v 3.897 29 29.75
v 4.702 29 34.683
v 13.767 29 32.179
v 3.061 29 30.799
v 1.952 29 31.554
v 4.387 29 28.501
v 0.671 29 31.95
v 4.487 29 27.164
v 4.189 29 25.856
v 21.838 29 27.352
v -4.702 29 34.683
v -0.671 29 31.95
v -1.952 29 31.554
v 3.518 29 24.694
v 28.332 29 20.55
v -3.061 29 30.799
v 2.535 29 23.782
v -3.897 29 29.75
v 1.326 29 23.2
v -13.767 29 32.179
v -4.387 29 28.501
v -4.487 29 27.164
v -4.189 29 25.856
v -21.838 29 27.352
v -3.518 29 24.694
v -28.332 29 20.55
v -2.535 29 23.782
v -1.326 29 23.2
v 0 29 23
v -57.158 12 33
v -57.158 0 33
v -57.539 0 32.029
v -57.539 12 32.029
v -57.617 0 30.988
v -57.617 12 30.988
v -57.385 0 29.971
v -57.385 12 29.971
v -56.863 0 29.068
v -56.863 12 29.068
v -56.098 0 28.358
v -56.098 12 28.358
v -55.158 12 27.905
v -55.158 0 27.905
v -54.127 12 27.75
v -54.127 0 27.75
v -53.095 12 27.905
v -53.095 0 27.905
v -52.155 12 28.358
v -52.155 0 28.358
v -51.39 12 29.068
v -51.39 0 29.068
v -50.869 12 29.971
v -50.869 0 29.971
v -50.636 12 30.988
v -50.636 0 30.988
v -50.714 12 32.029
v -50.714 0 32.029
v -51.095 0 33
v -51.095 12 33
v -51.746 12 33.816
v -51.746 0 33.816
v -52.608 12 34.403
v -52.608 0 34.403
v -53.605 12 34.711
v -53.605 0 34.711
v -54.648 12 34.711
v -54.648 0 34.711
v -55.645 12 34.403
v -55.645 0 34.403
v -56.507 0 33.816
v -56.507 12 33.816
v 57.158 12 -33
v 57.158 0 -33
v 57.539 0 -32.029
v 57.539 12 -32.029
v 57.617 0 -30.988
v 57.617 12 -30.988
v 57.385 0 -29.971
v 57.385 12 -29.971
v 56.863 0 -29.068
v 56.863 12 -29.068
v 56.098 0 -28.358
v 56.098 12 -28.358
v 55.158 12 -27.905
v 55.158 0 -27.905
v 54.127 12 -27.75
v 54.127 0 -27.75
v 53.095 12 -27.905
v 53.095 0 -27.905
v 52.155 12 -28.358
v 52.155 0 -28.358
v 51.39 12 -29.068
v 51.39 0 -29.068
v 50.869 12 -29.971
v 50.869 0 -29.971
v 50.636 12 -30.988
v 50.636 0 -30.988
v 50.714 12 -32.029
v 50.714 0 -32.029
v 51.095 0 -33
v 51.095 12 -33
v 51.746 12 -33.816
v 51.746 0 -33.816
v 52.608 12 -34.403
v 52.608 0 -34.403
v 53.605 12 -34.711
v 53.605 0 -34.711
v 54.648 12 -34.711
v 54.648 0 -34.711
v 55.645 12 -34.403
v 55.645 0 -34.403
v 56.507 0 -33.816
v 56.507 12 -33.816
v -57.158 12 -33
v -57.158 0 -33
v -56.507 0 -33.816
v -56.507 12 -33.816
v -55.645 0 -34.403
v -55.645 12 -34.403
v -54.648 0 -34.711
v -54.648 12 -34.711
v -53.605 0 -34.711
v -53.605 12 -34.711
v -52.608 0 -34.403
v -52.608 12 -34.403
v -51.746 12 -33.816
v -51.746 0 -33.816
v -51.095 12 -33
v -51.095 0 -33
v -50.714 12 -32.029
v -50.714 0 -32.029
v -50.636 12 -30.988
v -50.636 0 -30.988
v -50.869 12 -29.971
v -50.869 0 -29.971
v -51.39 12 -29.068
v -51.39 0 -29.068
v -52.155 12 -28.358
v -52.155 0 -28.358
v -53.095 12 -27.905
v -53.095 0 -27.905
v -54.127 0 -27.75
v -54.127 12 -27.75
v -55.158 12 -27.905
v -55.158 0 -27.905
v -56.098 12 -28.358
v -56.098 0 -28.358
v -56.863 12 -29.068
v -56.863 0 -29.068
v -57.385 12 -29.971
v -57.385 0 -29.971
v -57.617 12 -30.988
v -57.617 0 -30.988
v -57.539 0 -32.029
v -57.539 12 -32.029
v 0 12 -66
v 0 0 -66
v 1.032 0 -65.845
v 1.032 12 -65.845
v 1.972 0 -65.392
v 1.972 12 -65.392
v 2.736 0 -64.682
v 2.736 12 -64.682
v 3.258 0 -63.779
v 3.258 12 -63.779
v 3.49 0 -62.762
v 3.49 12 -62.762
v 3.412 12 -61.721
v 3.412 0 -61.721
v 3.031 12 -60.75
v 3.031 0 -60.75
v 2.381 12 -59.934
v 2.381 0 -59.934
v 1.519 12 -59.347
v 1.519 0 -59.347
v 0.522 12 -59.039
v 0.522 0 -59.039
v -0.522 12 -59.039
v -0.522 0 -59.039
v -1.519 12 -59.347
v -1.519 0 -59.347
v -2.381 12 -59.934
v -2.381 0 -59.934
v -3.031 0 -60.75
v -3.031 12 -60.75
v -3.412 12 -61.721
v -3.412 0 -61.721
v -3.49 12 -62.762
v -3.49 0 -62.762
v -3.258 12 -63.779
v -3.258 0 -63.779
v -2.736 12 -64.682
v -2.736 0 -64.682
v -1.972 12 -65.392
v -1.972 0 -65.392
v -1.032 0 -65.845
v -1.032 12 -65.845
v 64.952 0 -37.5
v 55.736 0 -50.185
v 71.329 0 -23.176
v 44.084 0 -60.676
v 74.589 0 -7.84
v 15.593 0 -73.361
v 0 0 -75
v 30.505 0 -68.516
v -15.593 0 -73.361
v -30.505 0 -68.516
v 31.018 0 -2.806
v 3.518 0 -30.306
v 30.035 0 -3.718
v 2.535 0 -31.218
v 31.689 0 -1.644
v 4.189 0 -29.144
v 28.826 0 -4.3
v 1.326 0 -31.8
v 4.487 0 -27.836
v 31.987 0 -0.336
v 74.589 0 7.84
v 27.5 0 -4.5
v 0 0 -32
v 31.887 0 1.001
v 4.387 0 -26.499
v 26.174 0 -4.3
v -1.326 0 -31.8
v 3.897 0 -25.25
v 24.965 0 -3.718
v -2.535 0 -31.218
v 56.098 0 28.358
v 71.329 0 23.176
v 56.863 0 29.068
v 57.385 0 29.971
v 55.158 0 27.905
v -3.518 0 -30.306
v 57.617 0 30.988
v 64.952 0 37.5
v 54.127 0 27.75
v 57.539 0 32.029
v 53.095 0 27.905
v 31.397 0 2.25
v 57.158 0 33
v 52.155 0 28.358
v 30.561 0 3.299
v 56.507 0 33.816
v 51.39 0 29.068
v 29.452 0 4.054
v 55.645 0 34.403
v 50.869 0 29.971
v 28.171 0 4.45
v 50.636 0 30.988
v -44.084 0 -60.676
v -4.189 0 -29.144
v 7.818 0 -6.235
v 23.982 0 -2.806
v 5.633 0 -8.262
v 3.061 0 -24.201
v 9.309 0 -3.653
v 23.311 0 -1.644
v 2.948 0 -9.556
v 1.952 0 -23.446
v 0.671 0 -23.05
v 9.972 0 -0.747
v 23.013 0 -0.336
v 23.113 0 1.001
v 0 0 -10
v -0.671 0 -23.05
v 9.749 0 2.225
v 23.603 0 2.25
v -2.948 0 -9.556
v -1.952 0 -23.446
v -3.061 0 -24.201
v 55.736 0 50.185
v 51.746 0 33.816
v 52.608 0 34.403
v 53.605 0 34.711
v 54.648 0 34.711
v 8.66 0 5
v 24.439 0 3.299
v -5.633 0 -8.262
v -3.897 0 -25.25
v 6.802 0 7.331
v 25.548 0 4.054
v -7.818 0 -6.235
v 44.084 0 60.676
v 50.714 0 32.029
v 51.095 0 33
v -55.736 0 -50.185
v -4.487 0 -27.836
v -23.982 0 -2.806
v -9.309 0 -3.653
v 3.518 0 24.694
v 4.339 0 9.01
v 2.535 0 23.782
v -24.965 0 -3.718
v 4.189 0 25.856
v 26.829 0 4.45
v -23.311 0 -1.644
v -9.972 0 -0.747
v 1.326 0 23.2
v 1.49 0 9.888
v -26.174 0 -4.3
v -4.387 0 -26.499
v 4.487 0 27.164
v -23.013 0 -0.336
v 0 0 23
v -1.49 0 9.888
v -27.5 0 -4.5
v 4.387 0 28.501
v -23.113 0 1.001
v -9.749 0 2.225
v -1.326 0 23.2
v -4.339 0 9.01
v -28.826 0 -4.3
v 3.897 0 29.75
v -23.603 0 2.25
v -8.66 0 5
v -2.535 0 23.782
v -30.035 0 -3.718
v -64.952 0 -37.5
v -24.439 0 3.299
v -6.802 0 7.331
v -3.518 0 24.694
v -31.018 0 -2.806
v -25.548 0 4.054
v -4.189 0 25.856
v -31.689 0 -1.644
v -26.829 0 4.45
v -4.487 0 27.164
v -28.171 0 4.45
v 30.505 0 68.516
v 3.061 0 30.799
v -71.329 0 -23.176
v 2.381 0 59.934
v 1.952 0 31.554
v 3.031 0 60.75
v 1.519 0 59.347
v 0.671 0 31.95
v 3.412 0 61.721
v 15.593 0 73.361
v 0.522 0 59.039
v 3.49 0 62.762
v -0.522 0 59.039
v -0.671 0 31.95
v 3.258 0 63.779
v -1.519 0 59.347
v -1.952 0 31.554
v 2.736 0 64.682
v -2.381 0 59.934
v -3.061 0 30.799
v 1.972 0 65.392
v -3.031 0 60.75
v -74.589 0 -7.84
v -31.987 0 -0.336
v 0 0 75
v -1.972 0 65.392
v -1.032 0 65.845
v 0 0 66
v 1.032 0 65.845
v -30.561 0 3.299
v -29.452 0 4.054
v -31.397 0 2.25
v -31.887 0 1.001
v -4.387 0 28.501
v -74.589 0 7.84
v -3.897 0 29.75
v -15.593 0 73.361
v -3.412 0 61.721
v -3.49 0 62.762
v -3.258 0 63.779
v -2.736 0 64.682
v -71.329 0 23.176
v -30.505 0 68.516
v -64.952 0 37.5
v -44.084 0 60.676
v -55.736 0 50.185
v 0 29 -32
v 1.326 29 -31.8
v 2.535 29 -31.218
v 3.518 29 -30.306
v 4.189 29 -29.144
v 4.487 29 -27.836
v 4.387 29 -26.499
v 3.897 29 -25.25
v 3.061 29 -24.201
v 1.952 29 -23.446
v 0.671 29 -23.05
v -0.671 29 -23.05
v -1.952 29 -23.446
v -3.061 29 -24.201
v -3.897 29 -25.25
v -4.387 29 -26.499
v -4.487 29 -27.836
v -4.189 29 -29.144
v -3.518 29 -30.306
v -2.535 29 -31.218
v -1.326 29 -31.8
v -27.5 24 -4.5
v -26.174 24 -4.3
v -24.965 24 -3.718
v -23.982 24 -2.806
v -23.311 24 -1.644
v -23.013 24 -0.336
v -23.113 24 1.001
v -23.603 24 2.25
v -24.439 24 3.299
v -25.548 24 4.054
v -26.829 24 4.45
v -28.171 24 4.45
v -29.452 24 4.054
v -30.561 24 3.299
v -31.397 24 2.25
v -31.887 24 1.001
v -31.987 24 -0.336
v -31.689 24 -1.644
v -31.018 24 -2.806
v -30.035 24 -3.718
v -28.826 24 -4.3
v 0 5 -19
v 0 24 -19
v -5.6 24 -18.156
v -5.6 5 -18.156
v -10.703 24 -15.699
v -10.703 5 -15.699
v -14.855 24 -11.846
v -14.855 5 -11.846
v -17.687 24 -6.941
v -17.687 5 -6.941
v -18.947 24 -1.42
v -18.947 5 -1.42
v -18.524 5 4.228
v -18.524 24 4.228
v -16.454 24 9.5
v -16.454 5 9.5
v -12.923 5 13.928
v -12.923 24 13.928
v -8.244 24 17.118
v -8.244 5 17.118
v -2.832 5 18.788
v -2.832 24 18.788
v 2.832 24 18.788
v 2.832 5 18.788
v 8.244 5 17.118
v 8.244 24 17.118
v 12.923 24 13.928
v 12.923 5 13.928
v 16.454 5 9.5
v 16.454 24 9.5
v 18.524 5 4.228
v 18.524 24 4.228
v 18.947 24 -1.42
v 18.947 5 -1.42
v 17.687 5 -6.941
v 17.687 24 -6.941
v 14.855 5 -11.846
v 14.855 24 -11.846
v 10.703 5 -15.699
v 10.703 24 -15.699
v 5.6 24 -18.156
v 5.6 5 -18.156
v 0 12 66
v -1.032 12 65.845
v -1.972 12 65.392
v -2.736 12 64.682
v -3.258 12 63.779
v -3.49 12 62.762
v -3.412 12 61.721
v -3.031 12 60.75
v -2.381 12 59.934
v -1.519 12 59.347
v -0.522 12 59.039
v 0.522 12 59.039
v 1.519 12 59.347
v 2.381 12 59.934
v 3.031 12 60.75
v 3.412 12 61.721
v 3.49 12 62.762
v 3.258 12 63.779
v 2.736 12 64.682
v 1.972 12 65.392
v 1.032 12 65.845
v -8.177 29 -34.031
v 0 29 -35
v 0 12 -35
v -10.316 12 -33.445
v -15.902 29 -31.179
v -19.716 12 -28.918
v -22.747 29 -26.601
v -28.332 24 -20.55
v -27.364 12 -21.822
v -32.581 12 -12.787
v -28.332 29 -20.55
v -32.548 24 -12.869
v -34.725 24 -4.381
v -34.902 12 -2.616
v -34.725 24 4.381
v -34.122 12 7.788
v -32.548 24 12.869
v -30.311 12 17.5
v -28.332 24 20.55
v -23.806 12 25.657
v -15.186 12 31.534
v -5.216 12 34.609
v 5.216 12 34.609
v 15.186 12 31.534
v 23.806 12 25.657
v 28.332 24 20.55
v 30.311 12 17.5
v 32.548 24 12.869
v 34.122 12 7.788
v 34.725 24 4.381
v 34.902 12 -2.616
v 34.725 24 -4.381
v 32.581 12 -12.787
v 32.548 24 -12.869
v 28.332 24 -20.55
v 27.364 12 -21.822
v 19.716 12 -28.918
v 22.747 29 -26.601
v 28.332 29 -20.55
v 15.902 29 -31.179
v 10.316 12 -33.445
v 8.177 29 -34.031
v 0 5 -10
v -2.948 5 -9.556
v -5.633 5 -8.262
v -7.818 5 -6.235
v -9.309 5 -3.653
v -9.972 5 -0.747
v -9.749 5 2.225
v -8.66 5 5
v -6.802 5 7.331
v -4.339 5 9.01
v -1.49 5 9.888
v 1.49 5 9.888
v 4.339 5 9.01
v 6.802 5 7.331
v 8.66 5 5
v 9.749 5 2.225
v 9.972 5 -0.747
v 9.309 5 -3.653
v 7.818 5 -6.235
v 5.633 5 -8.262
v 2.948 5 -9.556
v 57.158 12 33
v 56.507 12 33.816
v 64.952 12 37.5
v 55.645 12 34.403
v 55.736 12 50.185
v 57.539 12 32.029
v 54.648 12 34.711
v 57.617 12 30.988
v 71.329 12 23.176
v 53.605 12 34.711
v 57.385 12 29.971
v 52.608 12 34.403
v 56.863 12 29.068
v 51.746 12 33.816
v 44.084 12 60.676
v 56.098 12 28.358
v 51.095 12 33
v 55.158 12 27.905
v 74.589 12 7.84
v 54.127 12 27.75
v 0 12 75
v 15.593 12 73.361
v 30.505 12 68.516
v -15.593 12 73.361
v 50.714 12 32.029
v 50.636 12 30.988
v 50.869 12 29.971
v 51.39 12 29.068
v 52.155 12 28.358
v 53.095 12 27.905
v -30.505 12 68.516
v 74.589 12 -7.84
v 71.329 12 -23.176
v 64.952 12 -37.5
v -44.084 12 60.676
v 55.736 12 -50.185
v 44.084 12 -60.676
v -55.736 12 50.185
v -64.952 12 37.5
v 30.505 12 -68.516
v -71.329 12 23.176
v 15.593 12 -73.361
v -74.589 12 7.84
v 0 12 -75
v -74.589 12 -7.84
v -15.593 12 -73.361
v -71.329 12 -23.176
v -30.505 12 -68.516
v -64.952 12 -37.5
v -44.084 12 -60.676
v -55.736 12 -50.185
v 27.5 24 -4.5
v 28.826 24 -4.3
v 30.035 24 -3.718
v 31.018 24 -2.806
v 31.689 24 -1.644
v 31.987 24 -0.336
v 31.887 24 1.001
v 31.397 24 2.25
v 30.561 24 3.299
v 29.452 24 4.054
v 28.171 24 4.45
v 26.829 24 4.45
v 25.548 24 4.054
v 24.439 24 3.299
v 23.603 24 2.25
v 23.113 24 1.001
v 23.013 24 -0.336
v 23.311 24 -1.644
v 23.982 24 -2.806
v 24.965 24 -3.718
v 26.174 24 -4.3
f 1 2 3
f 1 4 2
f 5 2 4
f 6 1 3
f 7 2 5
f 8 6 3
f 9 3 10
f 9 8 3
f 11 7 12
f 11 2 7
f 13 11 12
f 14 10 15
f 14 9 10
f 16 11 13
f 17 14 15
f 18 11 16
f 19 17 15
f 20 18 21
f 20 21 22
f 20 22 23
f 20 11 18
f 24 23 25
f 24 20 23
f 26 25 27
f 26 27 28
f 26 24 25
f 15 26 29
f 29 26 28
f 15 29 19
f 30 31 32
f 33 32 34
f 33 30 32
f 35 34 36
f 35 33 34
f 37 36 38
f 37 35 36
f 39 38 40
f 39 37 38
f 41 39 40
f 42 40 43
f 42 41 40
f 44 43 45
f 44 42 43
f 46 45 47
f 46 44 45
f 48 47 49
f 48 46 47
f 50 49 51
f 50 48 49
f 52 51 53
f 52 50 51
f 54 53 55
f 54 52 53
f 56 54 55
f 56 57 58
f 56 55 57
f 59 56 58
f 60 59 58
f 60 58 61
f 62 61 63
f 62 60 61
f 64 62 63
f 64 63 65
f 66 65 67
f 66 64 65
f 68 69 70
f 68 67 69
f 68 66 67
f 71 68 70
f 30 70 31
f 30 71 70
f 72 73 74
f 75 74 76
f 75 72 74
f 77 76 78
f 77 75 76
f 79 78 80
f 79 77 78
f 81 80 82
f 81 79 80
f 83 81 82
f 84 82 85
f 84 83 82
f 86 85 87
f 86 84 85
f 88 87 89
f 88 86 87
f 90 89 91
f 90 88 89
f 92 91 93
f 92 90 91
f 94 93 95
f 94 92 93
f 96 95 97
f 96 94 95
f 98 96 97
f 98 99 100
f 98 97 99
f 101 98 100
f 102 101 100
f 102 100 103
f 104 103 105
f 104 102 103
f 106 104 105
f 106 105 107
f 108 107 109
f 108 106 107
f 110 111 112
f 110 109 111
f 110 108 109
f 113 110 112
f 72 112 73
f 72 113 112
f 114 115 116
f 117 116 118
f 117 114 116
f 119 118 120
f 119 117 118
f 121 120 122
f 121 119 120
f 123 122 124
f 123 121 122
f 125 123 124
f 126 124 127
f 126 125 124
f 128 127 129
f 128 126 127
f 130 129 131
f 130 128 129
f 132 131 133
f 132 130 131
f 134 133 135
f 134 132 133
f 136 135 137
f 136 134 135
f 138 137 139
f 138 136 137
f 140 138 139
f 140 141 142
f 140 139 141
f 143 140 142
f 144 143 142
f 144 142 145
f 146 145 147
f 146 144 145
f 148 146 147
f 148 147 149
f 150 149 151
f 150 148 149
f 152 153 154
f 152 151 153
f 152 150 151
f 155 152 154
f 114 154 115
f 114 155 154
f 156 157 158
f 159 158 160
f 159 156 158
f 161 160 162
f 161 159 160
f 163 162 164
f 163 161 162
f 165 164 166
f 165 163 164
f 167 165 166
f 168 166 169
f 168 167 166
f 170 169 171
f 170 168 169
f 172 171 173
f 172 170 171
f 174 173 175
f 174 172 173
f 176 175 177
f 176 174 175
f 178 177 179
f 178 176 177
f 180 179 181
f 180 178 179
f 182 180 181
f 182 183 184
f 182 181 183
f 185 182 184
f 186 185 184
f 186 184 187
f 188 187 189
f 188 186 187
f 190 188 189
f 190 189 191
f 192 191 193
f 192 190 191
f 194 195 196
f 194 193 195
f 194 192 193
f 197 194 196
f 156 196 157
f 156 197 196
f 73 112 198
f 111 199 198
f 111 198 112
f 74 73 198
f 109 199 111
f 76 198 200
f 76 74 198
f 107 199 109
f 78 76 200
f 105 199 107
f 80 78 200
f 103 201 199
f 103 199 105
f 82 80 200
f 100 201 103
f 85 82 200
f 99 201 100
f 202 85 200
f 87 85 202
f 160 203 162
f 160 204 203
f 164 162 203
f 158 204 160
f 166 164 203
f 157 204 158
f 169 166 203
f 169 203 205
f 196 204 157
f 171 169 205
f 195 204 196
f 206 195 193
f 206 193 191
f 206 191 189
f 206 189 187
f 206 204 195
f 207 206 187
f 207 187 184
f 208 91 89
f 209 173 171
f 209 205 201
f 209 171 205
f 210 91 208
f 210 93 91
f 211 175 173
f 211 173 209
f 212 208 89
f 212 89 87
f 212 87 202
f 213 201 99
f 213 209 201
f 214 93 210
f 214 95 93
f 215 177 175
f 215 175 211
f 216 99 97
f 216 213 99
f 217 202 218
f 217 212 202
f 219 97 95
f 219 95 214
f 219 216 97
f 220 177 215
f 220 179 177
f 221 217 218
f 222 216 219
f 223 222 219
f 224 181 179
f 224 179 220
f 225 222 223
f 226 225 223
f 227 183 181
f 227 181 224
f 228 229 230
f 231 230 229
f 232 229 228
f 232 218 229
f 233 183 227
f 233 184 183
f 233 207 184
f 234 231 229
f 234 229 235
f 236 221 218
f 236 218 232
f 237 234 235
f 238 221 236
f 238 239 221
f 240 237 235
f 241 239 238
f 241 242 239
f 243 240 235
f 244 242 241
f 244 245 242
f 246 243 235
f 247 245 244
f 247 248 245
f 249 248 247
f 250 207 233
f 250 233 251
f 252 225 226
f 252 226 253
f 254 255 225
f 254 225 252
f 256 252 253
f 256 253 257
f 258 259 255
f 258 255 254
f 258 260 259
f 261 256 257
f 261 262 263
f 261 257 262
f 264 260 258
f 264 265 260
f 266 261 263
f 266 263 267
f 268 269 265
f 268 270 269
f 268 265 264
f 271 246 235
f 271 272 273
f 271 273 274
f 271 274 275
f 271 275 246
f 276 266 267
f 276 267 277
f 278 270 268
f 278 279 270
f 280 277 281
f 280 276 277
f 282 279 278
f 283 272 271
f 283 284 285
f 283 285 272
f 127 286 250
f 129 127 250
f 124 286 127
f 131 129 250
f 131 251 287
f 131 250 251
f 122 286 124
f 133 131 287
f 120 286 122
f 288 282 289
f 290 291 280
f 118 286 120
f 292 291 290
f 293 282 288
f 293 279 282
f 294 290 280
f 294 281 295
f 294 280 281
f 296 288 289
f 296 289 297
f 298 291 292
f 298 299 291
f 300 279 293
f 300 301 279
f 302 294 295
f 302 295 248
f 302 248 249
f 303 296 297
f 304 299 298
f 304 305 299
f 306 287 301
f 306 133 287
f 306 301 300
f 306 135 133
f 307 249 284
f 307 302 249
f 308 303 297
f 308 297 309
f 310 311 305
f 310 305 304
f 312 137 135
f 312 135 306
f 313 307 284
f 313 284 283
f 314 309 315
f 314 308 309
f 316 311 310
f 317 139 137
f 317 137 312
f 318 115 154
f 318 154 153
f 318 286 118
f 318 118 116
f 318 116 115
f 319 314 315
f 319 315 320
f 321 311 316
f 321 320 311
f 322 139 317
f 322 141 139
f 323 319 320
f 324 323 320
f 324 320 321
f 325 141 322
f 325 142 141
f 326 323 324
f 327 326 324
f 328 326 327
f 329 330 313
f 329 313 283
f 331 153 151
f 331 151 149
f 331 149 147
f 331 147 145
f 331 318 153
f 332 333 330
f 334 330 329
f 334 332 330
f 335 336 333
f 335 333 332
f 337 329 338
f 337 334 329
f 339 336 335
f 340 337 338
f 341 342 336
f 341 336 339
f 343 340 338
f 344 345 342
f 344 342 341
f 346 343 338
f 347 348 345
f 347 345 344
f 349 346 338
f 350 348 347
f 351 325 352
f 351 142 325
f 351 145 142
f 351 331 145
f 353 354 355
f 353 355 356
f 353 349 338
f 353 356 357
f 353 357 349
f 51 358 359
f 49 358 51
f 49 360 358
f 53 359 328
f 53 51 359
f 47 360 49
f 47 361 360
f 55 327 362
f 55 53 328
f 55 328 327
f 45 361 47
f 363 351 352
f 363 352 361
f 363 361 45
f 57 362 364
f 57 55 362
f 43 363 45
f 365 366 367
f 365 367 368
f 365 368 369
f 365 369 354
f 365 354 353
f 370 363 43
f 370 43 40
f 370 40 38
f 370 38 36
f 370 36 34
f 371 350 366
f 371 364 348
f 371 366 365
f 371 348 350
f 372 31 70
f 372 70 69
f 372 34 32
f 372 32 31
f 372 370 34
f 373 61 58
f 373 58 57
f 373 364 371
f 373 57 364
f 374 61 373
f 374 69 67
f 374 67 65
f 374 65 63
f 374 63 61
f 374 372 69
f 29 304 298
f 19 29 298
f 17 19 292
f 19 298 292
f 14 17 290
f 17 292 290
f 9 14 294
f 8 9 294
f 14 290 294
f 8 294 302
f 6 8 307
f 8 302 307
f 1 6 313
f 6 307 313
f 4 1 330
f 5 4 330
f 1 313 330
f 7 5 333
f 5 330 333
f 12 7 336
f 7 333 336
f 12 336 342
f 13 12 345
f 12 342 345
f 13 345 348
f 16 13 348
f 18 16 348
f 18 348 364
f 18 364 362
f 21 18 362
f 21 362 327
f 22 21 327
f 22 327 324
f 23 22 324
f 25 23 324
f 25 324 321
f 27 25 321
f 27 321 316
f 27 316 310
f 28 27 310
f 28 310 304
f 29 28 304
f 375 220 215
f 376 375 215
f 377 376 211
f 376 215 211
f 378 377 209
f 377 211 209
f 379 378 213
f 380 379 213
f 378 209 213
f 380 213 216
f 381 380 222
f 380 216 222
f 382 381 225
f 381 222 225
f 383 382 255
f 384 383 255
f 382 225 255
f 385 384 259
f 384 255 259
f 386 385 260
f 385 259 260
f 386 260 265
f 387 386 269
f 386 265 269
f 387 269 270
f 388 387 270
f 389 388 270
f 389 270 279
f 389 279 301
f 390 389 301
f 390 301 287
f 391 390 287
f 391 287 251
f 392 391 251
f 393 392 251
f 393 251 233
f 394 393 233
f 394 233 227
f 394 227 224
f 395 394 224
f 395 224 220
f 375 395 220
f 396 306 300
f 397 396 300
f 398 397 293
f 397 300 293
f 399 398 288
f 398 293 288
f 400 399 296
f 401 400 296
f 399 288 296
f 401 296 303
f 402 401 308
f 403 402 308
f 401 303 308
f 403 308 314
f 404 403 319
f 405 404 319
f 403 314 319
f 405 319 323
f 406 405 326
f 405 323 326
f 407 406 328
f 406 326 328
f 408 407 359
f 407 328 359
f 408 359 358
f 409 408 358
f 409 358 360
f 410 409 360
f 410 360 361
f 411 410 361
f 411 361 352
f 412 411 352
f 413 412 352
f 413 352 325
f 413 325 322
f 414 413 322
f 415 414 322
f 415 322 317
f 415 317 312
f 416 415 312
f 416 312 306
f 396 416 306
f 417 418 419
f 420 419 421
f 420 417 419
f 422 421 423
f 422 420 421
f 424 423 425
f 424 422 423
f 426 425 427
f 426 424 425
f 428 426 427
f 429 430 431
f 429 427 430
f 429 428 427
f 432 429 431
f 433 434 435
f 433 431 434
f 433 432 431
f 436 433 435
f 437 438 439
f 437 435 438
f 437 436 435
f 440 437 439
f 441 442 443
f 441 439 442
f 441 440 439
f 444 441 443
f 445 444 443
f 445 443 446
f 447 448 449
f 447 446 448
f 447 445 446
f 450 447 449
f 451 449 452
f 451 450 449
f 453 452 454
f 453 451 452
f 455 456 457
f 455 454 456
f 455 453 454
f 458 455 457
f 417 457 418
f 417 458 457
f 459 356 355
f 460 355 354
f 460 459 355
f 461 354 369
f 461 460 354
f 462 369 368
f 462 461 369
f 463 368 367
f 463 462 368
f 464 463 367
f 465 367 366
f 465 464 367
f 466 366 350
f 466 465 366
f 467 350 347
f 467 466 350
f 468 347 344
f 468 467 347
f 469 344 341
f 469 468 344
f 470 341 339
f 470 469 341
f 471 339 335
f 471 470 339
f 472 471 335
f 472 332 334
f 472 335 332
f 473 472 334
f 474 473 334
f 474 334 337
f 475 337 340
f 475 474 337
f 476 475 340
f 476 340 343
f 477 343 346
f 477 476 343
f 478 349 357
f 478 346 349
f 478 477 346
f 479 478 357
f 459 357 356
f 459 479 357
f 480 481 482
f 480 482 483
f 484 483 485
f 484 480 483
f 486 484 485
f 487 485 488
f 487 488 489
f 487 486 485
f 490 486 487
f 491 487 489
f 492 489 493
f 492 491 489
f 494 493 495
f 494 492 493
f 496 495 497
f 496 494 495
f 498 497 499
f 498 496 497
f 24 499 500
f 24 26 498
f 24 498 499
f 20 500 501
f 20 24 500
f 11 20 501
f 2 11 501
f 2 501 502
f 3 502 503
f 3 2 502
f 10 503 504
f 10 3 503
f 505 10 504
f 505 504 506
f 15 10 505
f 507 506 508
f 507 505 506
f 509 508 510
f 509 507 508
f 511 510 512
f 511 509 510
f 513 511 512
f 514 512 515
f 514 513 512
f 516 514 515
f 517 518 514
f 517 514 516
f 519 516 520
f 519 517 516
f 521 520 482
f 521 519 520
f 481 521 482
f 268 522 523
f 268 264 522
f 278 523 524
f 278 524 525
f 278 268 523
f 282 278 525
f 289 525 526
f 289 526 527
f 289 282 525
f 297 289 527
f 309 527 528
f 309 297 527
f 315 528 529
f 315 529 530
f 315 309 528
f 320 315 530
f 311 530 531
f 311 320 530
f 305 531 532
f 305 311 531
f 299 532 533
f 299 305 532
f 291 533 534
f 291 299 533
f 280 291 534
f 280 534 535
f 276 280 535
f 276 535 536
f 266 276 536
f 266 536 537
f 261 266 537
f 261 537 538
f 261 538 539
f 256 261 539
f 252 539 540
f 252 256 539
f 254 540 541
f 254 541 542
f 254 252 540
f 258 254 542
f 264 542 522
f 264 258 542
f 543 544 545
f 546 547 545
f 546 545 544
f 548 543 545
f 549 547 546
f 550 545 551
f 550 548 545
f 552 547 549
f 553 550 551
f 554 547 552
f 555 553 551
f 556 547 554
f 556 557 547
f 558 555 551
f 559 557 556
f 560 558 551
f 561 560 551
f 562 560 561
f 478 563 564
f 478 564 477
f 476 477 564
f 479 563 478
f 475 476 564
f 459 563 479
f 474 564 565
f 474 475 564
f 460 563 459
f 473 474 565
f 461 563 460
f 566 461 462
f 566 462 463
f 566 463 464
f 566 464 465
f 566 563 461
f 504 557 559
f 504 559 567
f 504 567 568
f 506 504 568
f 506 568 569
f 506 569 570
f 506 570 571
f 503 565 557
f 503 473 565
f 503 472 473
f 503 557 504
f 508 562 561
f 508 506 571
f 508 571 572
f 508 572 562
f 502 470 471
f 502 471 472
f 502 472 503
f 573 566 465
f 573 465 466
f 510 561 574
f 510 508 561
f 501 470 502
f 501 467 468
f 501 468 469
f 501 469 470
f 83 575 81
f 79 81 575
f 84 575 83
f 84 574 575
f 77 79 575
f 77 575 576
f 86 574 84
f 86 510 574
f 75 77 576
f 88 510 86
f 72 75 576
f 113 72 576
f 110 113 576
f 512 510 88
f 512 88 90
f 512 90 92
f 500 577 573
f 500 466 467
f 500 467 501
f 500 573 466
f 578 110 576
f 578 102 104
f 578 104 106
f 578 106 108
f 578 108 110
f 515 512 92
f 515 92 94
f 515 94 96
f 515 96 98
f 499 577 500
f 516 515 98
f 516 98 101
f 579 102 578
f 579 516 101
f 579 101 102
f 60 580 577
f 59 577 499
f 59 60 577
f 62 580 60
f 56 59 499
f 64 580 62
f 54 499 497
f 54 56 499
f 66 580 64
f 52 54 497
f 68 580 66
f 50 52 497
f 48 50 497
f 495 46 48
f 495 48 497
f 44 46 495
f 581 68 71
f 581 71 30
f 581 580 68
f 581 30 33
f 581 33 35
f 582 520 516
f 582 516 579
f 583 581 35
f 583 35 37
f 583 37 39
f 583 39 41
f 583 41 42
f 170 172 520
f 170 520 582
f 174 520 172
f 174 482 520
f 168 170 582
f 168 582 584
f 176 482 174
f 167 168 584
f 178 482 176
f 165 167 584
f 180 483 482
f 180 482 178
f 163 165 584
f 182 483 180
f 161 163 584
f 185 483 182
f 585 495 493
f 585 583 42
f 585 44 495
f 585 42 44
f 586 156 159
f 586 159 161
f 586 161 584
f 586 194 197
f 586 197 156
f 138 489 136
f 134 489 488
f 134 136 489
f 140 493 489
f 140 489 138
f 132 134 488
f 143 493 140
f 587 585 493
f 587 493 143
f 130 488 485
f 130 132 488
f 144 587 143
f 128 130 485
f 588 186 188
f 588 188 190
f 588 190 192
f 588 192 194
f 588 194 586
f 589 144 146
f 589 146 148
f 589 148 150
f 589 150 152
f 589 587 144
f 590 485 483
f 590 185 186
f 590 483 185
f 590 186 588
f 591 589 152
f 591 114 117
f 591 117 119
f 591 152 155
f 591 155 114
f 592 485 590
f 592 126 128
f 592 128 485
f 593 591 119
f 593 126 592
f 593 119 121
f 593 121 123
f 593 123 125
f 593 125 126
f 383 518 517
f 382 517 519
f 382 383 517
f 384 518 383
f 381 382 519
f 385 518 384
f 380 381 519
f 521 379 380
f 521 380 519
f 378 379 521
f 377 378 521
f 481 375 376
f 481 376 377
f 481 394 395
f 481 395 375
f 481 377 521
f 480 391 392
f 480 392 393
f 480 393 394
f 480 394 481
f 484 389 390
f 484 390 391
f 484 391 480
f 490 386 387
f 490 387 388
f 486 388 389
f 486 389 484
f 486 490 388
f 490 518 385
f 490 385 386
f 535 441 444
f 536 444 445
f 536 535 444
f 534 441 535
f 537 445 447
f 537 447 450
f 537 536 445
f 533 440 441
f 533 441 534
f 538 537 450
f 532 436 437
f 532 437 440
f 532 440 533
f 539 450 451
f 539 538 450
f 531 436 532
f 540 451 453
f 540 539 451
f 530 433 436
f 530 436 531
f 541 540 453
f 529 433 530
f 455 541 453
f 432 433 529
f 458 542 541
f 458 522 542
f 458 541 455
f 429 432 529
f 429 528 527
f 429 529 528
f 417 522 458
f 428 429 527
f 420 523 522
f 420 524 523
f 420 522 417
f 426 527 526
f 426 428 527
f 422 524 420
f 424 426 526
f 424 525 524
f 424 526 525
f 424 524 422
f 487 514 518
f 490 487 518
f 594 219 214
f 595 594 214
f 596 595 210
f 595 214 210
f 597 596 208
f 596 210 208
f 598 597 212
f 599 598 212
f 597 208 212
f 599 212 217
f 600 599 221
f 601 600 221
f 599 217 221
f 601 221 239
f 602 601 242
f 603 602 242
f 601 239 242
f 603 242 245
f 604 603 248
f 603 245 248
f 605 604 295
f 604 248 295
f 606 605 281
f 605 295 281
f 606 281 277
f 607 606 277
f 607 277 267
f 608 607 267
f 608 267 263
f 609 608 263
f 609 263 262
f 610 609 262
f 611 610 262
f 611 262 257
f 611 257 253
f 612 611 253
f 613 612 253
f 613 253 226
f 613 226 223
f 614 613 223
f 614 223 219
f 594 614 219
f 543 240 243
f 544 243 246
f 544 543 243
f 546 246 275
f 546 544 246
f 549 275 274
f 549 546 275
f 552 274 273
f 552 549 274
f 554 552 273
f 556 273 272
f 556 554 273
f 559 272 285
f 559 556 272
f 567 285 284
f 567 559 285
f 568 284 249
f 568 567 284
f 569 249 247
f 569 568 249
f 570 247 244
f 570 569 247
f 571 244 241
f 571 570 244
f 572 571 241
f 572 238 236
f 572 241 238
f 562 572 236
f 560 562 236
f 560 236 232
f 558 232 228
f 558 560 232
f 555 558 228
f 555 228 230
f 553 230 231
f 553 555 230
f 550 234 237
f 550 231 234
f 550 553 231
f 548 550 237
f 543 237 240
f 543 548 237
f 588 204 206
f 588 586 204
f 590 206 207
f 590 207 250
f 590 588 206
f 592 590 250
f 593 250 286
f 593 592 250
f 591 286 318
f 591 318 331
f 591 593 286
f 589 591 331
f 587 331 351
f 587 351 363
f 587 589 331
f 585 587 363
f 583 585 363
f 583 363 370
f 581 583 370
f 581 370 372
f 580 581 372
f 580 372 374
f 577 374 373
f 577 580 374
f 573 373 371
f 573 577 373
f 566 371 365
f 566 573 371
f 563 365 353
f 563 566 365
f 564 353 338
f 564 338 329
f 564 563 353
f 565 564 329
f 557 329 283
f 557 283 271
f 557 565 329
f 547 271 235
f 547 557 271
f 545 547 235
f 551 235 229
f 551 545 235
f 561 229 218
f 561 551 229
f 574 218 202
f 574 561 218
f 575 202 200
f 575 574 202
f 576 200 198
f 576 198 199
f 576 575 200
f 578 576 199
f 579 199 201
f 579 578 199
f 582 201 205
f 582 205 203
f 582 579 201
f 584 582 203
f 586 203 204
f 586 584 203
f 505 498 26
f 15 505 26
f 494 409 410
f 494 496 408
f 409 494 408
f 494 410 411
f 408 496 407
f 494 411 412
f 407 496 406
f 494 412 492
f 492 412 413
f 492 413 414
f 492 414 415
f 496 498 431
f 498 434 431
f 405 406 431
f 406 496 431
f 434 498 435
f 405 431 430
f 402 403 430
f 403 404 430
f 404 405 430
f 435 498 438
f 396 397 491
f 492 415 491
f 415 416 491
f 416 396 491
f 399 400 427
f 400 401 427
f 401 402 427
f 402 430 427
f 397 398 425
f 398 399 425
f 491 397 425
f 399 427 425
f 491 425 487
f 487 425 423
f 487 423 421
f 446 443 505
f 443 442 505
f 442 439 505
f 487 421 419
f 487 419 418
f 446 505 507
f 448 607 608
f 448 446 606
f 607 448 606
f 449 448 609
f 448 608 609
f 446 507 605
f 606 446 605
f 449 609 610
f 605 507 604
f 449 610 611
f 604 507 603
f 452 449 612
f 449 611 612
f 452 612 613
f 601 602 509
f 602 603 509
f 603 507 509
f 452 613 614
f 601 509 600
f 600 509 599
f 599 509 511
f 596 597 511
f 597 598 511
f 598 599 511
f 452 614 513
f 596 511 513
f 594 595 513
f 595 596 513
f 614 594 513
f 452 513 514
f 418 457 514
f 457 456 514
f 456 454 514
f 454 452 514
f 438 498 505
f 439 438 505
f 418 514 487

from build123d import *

# Parameters (mm, degrees)
SKETCH3_W         = 41.1
SKETCH3_H         = 5
EXTRUDE2_DEPTH    = 60
SKETCH2_R         = 4.5
EXTRUDE1_DEPTH    = 110.959083299
CIRPATTERN1_COUNT = 6


with BuildPart() as part:
    # Sketch1 → Revolve1 (revolve)
    with BuildSketch(Plane.XY, mode=Mode.PRIVATE) as revolve1_sk:
        Polygon((-10, 0), (-75, 0), (-75, 12), (-35, 12), (-35, 29), (-19, 29), (-19, 5), (-10, 5), align=None)
    revolve(revolve1_sk.sketch.rotate(Axis((0, 0, 0), (0, 1, 0)), 270), axis=Axis((0, 0, 0), (0, 1, 0)))

    # Sketch3 → Extrude2 (cut, symmetric)
    with BuildSketch(Plane(origin=(0, 0, 0), x_dir=(0, 0, -1), z_dir=(1, 0, 0))):
        with Locations((0, 26.5)):
            Rectangle(SKETCH3_W, SKETCH3_H)
    extrude(amount=EXTRUDE2_DEPTH, both=True, mode=Mode.SUBTRACT)

    # Sketch2 → Extrude1 (cut, through all)
    with BuildSketch(Plane.XZ):
        with Locations(Location((-27.5, 0, 0), (0, 0, 270))):
            Circle(SKETCH2_R)
        with Locations(Location((0, -27.5, 0), (0, 0, 270))):
            Circle(SKETCH2_R)
        with Locations(Location((0, 27.5, 0), (0, 0, 270))):
            Circle(SKETCH2_R)
        with Locations(Location((27.5, 0, 0), (0, 0, 270))):
            Circle(SKETCH2_R)
    extrude(amount=-EXTRUDE1_DEPTH, mode=Mode.SUBTRACT)

    # Sketch4 → M8x1.0 Tapped Hole1 (revolve, cut)
    with BuildSketch(Plane(origin=(0, 12, 62.5), x_dir=(0, 0, 1), z_dir=(1, 0, 0))):
        Polygon((0, 0), (0, 23.103012167), (3.5, 21), (3.5, 0), align=None)
    m8x1_0_tapped_hole1 = revolve(axis=Axis((0, 18.35, 62.5), (0, -1, 0)), mode=Mode.SUBTRACT)

    # CirPattern1: M8x1.0 Tapped Hole1 ×6 about axis
    cirpattern1_axis = Axis((0, 0, 0), (0, 1, 0))
    for i in range(1, CIRPATTERN1_COUNT):
        add(m8x1_0_tapped_hole1.rotate(cirpattern1_axis, i * 360 / CIRPATTERN1_COUNT), mode=Mode.SUBTRACT)


solid = part.part
